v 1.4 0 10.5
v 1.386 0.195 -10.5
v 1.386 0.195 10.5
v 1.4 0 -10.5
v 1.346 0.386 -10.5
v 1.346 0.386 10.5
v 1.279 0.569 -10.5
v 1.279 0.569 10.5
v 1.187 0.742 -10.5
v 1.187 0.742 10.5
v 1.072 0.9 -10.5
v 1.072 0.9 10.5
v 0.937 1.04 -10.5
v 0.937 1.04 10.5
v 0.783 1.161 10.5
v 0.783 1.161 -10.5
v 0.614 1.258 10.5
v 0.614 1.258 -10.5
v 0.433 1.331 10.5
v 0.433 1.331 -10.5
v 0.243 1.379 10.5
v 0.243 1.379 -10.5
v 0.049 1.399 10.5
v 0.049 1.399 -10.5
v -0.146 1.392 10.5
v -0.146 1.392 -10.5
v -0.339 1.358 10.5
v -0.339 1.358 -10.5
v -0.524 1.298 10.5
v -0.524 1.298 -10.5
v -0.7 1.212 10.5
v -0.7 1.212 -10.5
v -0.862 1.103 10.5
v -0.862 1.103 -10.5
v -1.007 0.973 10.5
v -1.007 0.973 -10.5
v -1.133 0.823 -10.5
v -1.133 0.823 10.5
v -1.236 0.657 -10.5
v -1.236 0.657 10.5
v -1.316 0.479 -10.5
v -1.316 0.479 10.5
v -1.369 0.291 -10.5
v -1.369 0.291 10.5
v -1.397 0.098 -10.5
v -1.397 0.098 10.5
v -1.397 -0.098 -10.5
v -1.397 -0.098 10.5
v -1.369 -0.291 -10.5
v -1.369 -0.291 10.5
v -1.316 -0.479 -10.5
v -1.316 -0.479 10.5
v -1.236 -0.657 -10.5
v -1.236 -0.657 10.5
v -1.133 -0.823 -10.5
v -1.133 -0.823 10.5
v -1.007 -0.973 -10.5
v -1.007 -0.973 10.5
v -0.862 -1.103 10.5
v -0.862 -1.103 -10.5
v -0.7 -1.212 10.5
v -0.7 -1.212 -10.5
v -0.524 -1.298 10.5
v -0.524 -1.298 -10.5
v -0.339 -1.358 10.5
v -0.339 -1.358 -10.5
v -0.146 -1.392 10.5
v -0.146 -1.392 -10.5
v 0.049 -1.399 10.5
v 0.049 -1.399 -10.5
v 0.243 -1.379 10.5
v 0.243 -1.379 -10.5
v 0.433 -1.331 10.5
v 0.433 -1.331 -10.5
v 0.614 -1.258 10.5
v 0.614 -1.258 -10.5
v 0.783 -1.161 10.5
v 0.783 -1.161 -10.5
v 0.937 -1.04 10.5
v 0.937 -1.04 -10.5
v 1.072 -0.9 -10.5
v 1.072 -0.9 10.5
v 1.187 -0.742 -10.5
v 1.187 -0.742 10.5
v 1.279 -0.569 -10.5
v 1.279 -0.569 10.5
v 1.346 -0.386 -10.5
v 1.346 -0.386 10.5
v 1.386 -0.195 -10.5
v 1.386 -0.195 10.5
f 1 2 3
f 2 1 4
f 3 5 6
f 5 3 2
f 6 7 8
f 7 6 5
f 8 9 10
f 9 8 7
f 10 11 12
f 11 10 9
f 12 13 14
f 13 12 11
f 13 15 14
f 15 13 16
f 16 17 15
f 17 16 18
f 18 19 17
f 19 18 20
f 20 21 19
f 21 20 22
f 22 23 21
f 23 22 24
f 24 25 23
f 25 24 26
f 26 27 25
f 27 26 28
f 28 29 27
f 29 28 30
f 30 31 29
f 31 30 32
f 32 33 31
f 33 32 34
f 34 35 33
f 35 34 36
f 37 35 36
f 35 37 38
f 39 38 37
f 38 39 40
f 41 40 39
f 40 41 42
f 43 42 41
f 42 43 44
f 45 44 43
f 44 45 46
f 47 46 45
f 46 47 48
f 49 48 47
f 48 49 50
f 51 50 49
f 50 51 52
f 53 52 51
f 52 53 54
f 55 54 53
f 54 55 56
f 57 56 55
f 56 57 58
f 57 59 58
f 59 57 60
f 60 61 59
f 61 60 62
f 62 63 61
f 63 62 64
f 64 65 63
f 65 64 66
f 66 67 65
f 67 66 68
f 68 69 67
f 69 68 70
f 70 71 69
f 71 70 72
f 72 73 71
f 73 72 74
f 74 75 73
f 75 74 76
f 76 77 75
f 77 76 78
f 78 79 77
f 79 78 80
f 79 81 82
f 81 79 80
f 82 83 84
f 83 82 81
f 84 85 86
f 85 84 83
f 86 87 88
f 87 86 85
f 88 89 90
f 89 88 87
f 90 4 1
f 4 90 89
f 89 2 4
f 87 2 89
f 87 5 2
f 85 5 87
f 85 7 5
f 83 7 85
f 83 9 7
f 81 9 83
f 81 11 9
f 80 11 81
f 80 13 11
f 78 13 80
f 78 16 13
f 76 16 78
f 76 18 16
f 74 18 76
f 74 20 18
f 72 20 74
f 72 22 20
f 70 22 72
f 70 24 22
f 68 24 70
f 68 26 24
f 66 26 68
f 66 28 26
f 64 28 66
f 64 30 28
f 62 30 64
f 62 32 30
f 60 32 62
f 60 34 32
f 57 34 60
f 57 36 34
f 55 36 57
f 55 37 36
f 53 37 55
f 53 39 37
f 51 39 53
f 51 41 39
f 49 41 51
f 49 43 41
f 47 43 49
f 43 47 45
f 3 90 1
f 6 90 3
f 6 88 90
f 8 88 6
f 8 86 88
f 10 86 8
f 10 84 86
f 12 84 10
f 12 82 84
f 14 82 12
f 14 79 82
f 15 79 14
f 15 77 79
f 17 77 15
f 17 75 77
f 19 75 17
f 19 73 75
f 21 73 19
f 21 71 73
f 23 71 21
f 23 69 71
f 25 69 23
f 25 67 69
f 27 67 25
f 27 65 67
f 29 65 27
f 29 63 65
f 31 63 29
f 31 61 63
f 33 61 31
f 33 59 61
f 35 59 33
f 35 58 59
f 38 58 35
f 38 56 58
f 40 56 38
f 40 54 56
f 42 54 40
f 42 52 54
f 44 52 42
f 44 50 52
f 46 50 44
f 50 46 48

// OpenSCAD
$fn=45;

radius_bar =5; //mm

bend_radius =5; //long wheel

angle_1 = 10;
angle_2 = 100;

module Carrier_Wheel_axle(){
    cylinder(r=1.4,h=21,center=true);  

}






module Carrier_Wheel(){
difference() {
    cylinder(r=10,h=10,center=true);
    rotate_extrude()
        translate([bend_radius + radius_bar, 0, 0])
        circle(r=radius_bar);
    cylinder(r=2,h=20,center=true);  
    }
}


*Carrier_Wheel();

Carrier_Wheel_axle();


       
